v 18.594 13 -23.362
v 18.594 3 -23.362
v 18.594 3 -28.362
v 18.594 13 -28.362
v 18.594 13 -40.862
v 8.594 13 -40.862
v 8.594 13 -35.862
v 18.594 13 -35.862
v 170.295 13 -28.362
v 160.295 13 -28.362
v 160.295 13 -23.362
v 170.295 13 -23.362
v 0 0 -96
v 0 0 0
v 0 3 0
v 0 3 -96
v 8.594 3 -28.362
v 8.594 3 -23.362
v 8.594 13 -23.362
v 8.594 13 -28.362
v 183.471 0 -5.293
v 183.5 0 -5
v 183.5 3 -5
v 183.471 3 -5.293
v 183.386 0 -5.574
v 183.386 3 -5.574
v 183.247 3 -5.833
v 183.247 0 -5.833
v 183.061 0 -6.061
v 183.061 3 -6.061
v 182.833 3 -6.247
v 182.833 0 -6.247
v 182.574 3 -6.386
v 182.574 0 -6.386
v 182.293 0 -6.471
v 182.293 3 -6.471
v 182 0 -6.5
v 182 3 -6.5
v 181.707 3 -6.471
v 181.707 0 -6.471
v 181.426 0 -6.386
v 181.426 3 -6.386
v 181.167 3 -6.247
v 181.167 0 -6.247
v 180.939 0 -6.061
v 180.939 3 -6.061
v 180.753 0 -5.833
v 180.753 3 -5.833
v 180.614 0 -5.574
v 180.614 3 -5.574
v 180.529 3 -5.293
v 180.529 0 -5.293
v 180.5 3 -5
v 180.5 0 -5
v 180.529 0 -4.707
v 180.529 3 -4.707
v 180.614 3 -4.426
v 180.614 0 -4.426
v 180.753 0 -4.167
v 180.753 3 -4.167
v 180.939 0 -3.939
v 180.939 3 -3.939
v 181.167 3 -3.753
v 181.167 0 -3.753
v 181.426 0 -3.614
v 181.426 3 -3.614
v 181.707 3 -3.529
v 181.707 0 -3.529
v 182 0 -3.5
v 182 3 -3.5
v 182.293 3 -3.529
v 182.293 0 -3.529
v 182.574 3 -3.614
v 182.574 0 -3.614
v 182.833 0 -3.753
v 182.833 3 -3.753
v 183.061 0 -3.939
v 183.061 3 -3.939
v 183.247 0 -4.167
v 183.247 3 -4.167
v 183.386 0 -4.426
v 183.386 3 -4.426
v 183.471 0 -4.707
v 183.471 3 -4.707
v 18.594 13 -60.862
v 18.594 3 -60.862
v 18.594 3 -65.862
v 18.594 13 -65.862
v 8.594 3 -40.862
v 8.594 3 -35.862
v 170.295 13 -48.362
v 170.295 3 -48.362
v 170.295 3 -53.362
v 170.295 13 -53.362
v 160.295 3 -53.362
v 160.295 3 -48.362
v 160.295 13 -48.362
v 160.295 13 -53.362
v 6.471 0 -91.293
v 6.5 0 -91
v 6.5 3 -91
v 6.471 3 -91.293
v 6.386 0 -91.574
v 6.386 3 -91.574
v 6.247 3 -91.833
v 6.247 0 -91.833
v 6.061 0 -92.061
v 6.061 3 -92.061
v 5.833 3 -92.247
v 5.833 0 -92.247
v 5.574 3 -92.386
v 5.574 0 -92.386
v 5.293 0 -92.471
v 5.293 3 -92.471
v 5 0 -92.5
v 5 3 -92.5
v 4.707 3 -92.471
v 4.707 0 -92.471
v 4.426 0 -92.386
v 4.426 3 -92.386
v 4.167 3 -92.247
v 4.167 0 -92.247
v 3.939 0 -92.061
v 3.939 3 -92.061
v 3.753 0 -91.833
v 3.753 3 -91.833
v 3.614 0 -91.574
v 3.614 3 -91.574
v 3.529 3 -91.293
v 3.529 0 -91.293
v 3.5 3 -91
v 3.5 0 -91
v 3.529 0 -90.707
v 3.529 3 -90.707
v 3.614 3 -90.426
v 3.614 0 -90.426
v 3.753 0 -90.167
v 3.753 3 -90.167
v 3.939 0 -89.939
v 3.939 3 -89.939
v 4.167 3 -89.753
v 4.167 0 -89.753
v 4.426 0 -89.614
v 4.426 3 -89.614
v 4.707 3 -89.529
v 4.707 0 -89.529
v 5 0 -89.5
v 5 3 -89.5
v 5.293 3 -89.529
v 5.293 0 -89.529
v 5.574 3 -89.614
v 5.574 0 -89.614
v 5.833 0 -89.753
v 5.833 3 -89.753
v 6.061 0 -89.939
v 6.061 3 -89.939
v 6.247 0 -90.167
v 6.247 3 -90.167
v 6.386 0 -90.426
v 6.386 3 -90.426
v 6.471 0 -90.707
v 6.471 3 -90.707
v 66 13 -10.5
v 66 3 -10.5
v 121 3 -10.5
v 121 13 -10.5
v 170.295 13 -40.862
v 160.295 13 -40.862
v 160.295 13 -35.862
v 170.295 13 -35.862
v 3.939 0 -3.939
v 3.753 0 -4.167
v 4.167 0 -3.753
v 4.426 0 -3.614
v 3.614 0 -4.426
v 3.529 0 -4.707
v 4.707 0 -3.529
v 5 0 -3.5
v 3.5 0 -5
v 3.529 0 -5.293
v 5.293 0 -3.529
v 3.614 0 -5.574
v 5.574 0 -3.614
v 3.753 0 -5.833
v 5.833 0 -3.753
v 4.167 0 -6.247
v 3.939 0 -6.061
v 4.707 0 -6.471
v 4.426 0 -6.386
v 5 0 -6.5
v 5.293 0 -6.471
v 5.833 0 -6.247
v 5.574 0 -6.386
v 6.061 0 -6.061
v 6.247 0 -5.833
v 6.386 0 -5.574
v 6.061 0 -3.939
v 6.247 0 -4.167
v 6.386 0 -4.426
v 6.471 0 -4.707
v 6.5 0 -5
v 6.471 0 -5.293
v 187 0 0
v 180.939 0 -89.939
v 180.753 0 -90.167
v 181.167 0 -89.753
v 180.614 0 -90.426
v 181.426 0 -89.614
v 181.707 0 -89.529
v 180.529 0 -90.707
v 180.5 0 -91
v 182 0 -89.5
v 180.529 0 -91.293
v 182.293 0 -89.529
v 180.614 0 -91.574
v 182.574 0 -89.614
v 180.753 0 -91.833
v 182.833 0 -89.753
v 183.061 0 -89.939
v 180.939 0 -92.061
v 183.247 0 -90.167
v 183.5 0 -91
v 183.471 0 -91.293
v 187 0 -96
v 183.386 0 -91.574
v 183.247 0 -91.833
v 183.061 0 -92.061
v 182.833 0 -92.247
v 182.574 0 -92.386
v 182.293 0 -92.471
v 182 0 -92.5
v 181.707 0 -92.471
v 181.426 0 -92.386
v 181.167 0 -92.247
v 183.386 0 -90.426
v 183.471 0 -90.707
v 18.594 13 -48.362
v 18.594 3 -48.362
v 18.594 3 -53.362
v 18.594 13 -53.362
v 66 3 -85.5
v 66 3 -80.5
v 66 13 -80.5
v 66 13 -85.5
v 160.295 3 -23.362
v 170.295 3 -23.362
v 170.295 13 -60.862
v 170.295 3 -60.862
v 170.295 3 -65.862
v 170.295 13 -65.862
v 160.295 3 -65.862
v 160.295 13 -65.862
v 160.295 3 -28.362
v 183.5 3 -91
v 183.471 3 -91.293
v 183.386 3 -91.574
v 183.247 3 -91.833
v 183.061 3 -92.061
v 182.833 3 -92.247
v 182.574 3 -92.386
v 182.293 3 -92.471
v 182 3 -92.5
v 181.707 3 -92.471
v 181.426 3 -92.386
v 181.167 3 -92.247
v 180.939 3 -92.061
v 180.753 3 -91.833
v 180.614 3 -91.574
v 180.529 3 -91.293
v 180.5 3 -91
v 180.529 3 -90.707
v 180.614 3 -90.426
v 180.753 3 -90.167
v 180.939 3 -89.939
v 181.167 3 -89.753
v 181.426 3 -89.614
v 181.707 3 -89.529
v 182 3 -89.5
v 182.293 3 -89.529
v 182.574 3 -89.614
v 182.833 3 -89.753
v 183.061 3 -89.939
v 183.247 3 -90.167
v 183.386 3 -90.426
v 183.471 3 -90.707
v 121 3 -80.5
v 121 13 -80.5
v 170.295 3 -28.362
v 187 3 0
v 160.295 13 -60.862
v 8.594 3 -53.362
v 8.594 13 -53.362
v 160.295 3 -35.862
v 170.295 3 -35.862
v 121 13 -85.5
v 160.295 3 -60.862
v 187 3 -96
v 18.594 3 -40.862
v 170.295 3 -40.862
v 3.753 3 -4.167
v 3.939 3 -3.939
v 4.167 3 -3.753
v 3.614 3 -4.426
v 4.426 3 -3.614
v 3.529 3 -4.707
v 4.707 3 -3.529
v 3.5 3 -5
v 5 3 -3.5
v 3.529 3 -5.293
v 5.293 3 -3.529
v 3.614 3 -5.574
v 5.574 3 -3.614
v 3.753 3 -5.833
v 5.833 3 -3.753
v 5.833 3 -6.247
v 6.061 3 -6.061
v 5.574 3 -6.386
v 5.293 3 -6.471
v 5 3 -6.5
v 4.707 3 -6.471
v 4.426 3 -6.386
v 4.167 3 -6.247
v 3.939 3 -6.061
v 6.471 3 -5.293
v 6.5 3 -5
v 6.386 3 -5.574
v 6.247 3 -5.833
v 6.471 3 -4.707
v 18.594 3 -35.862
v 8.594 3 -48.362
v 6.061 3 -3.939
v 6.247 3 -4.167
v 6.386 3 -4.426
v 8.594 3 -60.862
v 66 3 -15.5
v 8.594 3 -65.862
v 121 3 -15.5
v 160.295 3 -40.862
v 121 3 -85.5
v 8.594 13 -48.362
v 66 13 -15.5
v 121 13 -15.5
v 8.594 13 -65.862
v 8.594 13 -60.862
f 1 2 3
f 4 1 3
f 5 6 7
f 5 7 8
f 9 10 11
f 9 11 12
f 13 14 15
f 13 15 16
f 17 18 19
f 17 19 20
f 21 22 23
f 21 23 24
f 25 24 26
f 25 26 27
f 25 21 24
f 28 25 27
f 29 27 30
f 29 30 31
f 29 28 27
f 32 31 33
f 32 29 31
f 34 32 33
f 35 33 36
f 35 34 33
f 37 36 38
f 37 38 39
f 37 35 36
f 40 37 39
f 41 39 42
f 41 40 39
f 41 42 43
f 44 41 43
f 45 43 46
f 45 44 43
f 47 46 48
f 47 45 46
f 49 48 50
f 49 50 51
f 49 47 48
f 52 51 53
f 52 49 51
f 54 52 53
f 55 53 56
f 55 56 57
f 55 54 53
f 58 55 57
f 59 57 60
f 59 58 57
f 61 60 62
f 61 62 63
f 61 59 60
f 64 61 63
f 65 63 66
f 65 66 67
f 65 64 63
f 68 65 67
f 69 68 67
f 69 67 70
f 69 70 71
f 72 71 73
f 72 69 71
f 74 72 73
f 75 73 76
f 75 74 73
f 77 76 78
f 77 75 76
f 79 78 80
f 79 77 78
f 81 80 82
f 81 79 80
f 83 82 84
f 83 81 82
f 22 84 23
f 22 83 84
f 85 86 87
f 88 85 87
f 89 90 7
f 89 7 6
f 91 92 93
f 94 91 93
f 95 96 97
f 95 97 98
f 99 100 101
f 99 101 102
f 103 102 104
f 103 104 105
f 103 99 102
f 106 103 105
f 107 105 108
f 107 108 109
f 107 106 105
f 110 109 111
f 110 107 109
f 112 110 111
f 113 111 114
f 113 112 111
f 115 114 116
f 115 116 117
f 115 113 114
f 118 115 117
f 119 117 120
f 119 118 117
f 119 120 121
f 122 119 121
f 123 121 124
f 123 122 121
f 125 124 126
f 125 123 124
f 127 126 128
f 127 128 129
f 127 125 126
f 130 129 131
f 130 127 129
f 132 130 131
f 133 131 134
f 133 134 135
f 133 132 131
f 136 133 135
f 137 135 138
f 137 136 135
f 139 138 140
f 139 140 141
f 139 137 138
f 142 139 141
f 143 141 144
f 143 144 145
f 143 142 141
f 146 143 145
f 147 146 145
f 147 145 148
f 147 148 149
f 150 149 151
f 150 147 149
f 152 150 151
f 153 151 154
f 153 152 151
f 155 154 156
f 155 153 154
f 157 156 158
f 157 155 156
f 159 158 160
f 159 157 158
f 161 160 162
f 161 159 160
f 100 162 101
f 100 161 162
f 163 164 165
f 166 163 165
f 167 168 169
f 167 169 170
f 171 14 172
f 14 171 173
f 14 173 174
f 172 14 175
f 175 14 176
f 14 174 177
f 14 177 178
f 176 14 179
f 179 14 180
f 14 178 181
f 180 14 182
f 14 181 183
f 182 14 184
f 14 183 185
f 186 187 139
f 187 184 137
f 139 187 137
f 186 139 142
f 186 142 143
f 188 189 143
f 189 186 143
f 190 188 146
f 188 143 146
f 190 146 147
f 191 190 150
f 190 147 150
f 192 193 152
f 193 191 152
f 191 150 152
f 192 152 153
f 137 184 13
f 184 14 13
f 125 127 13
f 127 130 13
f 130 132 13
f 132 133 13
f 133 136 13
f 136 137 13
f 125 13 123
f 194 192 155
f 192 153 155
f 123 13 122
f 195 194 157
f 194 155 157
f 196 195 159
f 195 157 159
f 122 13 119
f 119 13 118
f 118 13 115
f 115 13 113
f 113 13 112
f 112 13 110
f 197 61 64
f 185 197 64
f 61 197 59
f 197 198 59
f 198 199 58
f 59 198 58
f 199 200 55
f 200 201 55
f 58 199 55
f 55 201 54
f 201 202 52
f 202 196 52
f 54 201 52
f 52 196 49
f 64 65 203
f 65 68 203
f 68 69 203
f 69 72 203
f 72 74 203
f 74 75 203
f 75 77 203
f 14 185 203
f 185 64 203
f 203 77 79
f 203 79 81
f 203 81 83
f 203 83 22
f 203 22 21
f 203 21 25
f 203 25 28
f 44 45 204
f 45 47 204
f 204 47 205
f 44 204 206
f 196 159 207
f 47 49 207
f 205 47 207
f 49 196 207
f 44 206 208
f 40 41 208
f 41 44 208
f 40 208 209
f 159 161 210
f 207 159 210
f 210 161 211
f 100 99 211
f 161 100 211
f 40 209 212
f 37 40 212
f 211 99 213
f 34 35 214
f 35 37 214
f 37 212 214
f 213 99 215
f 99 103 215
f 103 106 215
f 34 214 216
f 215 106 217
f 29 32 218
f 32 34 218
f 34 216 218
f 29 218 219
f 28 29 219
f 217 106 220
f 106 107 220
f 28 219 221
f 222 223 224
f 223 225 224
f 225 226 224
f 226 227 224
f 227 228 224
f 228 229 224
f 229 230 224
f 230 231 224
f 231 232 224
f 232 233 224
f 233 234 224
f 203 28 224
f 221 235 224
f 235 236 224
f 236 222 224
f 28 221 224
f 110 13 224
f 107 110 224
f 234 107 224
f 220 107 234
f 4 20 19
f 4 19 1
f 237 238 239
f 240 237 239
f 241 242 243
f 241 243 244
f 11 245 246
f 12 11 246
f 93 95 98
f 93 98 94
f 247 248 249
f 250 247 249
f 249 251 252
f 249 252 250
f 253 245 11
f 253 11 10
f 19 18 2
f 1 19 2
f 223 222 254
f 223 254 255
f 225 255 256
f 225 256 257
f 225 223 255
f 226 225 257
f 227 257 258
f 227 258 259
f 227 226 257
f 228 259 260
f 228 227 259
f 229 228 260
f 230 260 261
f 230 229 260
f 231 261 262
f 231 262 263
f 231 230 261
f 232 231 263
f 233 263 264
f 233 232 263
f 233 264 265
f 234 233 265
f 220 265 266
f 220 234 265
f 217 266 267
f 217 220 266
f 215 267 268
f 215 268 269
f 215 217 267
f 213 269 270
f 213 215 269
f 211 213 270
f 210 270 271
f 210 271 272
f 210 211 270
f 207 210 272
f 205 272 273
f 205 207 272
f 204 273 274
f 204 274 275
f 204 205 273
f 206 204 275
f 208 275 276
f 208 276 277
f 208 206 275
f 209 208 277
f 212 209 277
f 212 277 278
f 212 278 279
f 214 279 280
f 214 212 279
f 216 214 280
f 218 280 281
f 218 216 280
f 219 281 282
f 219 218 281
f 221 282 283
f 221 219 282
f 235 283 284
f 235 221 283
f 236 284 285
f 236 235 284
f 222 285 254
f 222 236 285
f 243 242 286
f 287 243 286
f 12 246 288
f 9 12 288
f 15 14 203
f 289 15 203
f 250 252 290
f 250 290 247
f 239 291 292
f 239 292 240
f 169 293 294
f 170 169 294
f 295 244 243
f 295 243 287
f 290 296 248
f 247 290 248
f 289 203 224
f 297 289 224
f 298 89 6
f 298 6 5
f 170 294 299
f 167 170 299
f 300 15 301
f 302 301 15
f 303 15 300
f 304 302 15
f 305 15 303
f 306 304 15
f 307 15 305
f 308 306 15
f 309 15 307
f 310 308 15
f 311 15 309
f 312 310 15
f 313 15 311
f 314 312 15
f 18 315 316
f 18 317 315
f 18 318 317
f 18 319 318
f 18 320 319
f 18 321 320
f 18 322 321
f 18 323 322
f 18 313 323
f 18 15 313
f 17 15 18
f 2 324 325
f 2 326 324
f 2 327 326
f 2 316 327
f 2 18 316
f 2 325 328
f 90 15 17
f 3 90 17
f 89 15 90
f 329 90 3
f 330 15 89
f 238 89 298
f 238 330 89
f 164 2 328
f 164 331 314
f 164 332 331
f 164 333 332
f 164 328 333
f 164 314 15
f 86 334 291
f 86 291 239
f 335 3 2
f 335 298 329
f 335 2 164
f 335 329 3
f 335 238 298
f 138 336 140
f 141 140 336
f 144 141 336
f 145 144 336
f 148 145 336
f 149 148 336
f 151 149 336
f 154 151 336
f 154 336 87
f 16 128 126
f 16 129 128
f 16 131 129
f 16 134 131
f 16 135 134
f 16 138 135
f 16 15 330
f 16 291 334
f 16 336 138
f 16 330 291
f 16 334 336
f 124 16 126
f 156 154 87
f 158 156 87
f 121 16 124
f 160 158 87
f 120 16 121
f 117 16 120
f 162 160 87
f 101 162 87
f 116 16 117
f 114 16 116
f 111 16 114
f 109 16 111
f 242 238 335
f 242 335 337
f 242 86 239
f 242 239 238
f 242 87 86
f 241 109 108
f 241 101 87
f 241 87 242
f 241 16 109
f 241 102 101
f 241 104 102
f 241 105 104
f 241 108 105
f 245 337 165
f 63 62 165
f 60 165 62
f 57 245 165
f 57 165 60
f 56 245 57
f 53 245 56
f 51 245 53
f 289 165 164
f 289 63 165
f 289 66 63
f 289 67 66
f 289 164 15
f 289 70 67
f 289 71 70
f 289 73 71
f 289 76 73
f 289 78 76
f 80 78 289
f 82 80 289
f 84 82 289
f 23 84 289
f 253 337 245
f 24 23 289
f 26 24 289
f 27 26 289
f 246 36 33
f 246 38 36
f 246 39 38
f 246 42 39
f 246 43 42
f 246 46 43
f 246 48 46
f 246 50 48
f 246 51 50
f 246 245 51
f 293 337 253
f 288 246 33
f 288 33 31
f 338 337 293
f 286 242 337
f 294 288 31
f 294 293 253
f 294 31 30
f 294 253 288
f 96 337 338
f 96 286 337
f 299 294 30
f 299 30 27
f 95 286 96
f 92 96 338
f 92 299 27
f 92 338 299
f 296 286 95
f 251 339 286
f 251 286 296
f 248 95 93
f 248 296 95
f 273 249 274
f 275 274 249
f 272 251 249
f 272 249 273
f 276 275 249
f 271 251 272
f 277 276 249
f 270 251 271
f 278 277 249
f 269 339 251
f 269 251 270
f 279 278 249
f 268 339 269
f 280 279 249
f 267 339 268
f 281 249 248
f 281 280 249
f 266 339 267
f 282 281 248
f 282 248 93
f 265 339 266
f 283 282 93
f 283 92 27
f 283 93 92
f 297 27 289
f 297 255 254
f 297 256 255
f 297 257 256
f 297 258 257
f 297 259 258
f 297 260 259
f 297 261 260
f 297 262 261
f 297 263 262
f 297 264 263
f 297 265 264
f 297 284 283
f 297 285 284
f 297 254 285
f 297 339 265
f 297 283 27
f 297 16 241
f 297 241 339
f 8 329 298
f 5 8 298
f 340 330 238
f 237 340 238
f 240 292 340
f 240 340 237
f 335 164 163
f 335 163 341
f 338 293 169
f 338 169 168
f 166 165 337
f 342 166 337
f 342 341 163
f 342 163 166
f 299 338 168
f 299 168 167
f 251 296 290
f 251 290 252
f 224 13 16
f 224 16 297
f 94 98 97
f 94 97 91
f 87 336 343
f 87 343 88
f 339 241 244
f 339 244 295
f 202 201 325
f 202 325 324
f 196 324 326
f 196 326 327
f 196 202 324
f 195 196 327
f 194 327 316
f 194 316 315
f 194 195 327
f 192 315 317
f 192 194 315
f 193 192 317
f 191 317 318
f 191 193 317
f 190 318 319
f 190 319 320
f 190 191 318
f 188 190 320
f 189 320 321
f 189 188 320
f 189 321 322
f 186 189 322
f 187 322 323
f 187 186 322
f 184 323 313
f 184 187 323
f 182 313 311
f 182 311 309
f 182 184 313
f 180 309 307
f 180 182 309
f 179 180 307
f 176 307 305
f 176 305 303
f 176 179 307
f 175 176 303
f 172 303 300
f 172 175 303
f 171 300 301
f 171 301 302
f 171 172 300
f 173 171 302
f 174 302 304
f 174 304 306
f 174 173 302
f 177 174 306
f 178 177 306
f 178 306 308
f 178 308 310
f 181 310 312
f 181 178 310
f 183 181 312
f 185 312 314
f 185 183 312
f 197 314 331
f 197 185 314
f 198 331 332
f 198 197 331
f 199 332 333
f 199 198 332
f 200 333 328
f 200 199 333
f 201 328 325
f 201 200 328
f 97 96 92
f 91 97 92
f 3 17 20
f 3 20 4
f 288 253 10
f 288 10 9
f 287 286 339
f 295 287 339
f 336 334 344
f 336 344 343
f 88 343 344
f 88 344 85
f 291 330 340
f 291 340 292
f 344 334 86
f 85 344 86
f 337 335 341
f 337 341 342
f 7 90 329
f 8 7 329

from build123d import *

# Parameters (mm, degrees)
ESQUISSE1_W      = 187
ESQUISSE1_H      = 96
ESQUISSE1_R      = 1.5
EXTRUSION1_DEPTH = 3
ESQUISSE2_W      = 55
ESQUISSE2_H      = 5
EXTRUSION2_DEPTH = 10
ESQUISSE4_W      = 10
ESQUISSE4_H      = 5
EXTRUSION4_DEPTH = 10


with BuildPart() as part:
    # Esquisse1 → Extrusion1 (new body)
    with BuildSketch(Plane(origin=(0, 0, 0), x_dir=(1, 0, 0), z_dir=(0, 1, 0))):
        with Locations((93.5, 48)):
            Rectangle(ESQUISSE1_W, ESQUISSE1_H)
        with Locations((5, 91)):
            Circle(ESQUISSE1_R, mode=Mode.SUBTRACT)
        with Locations((182, 91)):
            Circle(ESQUISSE1_R, mode=Mode.SUBTRACT)
        with Locations((182, 5)):
            Circle(ESQUISSE1_R, mode=Mode.SUBTRACT)
        with Locations((5, 5)):
            Circle(ESQUISSE1_R, mode=Mode.SUBTRACT)
    extrude(amount=EXTRUSION1_DEPTH)

    # Esquisse2 → Extrusion2 (add)
    with BuildSketch(Plane(origin=(0, 3, 0), x_dir=(1, 0, 0), z_dir=(0, 1, 0))):
        with Locations((93.5, 83)):
            Rectangle(ESQUISSE2_W, ESQUISSE2_H)
        with Locations((93.5, 13)):
            Rectangle(ESQUISSE2_W, ESQUISSE2_H)
    extrude(amount=EXTRUSION2_DEPTH)

    # Esquisse4 → Extrusion4 (add)
    with BuildSketch(Plane(origin=(0, 3, 0), x_dir=(1, 0, 0), z_dir=(0, 1, 0))):
        with Locations((165.295070297, 63.362289653)):
            Rectangle(ESQUISSE4_W, ESQUISSE4_H)
        with Locations((13.593769781, 63.362289653)):
            Rectangle(ESQUISSE4_W, ESQUISSE4_H)
        with Locations((13.593769781, 38.362289653)):
            Rectangle(ESQUISSE4_W, ESQUISSE4_H)
        with Locations((13.593769781, 25.862289653)):
            Rectangle(ESQUISSE4_W, ESQUISSE4_H)
        with Locations((13.593769781, 50.862289653)):
            Rectangle(ESQUISSE4_W, ESQUISSE4_H)
        with Locations((165.295070297, 38.362289653)):
            Rectangle(ESQUISSE4_W, ESQUISSE4_H)
        with Locations((165.295070297, 25.862289653)):
            Rectangle(ESQUISSE4_W, ESQUISSE4_H)
        with Locations((165.295070297, 50.862289653)):
            Rectangle(ESQUISSE4_W, ESQUISSE4_H)
    extrude(amount=EXTRUSION4_DEPTH)


solid = part.part
